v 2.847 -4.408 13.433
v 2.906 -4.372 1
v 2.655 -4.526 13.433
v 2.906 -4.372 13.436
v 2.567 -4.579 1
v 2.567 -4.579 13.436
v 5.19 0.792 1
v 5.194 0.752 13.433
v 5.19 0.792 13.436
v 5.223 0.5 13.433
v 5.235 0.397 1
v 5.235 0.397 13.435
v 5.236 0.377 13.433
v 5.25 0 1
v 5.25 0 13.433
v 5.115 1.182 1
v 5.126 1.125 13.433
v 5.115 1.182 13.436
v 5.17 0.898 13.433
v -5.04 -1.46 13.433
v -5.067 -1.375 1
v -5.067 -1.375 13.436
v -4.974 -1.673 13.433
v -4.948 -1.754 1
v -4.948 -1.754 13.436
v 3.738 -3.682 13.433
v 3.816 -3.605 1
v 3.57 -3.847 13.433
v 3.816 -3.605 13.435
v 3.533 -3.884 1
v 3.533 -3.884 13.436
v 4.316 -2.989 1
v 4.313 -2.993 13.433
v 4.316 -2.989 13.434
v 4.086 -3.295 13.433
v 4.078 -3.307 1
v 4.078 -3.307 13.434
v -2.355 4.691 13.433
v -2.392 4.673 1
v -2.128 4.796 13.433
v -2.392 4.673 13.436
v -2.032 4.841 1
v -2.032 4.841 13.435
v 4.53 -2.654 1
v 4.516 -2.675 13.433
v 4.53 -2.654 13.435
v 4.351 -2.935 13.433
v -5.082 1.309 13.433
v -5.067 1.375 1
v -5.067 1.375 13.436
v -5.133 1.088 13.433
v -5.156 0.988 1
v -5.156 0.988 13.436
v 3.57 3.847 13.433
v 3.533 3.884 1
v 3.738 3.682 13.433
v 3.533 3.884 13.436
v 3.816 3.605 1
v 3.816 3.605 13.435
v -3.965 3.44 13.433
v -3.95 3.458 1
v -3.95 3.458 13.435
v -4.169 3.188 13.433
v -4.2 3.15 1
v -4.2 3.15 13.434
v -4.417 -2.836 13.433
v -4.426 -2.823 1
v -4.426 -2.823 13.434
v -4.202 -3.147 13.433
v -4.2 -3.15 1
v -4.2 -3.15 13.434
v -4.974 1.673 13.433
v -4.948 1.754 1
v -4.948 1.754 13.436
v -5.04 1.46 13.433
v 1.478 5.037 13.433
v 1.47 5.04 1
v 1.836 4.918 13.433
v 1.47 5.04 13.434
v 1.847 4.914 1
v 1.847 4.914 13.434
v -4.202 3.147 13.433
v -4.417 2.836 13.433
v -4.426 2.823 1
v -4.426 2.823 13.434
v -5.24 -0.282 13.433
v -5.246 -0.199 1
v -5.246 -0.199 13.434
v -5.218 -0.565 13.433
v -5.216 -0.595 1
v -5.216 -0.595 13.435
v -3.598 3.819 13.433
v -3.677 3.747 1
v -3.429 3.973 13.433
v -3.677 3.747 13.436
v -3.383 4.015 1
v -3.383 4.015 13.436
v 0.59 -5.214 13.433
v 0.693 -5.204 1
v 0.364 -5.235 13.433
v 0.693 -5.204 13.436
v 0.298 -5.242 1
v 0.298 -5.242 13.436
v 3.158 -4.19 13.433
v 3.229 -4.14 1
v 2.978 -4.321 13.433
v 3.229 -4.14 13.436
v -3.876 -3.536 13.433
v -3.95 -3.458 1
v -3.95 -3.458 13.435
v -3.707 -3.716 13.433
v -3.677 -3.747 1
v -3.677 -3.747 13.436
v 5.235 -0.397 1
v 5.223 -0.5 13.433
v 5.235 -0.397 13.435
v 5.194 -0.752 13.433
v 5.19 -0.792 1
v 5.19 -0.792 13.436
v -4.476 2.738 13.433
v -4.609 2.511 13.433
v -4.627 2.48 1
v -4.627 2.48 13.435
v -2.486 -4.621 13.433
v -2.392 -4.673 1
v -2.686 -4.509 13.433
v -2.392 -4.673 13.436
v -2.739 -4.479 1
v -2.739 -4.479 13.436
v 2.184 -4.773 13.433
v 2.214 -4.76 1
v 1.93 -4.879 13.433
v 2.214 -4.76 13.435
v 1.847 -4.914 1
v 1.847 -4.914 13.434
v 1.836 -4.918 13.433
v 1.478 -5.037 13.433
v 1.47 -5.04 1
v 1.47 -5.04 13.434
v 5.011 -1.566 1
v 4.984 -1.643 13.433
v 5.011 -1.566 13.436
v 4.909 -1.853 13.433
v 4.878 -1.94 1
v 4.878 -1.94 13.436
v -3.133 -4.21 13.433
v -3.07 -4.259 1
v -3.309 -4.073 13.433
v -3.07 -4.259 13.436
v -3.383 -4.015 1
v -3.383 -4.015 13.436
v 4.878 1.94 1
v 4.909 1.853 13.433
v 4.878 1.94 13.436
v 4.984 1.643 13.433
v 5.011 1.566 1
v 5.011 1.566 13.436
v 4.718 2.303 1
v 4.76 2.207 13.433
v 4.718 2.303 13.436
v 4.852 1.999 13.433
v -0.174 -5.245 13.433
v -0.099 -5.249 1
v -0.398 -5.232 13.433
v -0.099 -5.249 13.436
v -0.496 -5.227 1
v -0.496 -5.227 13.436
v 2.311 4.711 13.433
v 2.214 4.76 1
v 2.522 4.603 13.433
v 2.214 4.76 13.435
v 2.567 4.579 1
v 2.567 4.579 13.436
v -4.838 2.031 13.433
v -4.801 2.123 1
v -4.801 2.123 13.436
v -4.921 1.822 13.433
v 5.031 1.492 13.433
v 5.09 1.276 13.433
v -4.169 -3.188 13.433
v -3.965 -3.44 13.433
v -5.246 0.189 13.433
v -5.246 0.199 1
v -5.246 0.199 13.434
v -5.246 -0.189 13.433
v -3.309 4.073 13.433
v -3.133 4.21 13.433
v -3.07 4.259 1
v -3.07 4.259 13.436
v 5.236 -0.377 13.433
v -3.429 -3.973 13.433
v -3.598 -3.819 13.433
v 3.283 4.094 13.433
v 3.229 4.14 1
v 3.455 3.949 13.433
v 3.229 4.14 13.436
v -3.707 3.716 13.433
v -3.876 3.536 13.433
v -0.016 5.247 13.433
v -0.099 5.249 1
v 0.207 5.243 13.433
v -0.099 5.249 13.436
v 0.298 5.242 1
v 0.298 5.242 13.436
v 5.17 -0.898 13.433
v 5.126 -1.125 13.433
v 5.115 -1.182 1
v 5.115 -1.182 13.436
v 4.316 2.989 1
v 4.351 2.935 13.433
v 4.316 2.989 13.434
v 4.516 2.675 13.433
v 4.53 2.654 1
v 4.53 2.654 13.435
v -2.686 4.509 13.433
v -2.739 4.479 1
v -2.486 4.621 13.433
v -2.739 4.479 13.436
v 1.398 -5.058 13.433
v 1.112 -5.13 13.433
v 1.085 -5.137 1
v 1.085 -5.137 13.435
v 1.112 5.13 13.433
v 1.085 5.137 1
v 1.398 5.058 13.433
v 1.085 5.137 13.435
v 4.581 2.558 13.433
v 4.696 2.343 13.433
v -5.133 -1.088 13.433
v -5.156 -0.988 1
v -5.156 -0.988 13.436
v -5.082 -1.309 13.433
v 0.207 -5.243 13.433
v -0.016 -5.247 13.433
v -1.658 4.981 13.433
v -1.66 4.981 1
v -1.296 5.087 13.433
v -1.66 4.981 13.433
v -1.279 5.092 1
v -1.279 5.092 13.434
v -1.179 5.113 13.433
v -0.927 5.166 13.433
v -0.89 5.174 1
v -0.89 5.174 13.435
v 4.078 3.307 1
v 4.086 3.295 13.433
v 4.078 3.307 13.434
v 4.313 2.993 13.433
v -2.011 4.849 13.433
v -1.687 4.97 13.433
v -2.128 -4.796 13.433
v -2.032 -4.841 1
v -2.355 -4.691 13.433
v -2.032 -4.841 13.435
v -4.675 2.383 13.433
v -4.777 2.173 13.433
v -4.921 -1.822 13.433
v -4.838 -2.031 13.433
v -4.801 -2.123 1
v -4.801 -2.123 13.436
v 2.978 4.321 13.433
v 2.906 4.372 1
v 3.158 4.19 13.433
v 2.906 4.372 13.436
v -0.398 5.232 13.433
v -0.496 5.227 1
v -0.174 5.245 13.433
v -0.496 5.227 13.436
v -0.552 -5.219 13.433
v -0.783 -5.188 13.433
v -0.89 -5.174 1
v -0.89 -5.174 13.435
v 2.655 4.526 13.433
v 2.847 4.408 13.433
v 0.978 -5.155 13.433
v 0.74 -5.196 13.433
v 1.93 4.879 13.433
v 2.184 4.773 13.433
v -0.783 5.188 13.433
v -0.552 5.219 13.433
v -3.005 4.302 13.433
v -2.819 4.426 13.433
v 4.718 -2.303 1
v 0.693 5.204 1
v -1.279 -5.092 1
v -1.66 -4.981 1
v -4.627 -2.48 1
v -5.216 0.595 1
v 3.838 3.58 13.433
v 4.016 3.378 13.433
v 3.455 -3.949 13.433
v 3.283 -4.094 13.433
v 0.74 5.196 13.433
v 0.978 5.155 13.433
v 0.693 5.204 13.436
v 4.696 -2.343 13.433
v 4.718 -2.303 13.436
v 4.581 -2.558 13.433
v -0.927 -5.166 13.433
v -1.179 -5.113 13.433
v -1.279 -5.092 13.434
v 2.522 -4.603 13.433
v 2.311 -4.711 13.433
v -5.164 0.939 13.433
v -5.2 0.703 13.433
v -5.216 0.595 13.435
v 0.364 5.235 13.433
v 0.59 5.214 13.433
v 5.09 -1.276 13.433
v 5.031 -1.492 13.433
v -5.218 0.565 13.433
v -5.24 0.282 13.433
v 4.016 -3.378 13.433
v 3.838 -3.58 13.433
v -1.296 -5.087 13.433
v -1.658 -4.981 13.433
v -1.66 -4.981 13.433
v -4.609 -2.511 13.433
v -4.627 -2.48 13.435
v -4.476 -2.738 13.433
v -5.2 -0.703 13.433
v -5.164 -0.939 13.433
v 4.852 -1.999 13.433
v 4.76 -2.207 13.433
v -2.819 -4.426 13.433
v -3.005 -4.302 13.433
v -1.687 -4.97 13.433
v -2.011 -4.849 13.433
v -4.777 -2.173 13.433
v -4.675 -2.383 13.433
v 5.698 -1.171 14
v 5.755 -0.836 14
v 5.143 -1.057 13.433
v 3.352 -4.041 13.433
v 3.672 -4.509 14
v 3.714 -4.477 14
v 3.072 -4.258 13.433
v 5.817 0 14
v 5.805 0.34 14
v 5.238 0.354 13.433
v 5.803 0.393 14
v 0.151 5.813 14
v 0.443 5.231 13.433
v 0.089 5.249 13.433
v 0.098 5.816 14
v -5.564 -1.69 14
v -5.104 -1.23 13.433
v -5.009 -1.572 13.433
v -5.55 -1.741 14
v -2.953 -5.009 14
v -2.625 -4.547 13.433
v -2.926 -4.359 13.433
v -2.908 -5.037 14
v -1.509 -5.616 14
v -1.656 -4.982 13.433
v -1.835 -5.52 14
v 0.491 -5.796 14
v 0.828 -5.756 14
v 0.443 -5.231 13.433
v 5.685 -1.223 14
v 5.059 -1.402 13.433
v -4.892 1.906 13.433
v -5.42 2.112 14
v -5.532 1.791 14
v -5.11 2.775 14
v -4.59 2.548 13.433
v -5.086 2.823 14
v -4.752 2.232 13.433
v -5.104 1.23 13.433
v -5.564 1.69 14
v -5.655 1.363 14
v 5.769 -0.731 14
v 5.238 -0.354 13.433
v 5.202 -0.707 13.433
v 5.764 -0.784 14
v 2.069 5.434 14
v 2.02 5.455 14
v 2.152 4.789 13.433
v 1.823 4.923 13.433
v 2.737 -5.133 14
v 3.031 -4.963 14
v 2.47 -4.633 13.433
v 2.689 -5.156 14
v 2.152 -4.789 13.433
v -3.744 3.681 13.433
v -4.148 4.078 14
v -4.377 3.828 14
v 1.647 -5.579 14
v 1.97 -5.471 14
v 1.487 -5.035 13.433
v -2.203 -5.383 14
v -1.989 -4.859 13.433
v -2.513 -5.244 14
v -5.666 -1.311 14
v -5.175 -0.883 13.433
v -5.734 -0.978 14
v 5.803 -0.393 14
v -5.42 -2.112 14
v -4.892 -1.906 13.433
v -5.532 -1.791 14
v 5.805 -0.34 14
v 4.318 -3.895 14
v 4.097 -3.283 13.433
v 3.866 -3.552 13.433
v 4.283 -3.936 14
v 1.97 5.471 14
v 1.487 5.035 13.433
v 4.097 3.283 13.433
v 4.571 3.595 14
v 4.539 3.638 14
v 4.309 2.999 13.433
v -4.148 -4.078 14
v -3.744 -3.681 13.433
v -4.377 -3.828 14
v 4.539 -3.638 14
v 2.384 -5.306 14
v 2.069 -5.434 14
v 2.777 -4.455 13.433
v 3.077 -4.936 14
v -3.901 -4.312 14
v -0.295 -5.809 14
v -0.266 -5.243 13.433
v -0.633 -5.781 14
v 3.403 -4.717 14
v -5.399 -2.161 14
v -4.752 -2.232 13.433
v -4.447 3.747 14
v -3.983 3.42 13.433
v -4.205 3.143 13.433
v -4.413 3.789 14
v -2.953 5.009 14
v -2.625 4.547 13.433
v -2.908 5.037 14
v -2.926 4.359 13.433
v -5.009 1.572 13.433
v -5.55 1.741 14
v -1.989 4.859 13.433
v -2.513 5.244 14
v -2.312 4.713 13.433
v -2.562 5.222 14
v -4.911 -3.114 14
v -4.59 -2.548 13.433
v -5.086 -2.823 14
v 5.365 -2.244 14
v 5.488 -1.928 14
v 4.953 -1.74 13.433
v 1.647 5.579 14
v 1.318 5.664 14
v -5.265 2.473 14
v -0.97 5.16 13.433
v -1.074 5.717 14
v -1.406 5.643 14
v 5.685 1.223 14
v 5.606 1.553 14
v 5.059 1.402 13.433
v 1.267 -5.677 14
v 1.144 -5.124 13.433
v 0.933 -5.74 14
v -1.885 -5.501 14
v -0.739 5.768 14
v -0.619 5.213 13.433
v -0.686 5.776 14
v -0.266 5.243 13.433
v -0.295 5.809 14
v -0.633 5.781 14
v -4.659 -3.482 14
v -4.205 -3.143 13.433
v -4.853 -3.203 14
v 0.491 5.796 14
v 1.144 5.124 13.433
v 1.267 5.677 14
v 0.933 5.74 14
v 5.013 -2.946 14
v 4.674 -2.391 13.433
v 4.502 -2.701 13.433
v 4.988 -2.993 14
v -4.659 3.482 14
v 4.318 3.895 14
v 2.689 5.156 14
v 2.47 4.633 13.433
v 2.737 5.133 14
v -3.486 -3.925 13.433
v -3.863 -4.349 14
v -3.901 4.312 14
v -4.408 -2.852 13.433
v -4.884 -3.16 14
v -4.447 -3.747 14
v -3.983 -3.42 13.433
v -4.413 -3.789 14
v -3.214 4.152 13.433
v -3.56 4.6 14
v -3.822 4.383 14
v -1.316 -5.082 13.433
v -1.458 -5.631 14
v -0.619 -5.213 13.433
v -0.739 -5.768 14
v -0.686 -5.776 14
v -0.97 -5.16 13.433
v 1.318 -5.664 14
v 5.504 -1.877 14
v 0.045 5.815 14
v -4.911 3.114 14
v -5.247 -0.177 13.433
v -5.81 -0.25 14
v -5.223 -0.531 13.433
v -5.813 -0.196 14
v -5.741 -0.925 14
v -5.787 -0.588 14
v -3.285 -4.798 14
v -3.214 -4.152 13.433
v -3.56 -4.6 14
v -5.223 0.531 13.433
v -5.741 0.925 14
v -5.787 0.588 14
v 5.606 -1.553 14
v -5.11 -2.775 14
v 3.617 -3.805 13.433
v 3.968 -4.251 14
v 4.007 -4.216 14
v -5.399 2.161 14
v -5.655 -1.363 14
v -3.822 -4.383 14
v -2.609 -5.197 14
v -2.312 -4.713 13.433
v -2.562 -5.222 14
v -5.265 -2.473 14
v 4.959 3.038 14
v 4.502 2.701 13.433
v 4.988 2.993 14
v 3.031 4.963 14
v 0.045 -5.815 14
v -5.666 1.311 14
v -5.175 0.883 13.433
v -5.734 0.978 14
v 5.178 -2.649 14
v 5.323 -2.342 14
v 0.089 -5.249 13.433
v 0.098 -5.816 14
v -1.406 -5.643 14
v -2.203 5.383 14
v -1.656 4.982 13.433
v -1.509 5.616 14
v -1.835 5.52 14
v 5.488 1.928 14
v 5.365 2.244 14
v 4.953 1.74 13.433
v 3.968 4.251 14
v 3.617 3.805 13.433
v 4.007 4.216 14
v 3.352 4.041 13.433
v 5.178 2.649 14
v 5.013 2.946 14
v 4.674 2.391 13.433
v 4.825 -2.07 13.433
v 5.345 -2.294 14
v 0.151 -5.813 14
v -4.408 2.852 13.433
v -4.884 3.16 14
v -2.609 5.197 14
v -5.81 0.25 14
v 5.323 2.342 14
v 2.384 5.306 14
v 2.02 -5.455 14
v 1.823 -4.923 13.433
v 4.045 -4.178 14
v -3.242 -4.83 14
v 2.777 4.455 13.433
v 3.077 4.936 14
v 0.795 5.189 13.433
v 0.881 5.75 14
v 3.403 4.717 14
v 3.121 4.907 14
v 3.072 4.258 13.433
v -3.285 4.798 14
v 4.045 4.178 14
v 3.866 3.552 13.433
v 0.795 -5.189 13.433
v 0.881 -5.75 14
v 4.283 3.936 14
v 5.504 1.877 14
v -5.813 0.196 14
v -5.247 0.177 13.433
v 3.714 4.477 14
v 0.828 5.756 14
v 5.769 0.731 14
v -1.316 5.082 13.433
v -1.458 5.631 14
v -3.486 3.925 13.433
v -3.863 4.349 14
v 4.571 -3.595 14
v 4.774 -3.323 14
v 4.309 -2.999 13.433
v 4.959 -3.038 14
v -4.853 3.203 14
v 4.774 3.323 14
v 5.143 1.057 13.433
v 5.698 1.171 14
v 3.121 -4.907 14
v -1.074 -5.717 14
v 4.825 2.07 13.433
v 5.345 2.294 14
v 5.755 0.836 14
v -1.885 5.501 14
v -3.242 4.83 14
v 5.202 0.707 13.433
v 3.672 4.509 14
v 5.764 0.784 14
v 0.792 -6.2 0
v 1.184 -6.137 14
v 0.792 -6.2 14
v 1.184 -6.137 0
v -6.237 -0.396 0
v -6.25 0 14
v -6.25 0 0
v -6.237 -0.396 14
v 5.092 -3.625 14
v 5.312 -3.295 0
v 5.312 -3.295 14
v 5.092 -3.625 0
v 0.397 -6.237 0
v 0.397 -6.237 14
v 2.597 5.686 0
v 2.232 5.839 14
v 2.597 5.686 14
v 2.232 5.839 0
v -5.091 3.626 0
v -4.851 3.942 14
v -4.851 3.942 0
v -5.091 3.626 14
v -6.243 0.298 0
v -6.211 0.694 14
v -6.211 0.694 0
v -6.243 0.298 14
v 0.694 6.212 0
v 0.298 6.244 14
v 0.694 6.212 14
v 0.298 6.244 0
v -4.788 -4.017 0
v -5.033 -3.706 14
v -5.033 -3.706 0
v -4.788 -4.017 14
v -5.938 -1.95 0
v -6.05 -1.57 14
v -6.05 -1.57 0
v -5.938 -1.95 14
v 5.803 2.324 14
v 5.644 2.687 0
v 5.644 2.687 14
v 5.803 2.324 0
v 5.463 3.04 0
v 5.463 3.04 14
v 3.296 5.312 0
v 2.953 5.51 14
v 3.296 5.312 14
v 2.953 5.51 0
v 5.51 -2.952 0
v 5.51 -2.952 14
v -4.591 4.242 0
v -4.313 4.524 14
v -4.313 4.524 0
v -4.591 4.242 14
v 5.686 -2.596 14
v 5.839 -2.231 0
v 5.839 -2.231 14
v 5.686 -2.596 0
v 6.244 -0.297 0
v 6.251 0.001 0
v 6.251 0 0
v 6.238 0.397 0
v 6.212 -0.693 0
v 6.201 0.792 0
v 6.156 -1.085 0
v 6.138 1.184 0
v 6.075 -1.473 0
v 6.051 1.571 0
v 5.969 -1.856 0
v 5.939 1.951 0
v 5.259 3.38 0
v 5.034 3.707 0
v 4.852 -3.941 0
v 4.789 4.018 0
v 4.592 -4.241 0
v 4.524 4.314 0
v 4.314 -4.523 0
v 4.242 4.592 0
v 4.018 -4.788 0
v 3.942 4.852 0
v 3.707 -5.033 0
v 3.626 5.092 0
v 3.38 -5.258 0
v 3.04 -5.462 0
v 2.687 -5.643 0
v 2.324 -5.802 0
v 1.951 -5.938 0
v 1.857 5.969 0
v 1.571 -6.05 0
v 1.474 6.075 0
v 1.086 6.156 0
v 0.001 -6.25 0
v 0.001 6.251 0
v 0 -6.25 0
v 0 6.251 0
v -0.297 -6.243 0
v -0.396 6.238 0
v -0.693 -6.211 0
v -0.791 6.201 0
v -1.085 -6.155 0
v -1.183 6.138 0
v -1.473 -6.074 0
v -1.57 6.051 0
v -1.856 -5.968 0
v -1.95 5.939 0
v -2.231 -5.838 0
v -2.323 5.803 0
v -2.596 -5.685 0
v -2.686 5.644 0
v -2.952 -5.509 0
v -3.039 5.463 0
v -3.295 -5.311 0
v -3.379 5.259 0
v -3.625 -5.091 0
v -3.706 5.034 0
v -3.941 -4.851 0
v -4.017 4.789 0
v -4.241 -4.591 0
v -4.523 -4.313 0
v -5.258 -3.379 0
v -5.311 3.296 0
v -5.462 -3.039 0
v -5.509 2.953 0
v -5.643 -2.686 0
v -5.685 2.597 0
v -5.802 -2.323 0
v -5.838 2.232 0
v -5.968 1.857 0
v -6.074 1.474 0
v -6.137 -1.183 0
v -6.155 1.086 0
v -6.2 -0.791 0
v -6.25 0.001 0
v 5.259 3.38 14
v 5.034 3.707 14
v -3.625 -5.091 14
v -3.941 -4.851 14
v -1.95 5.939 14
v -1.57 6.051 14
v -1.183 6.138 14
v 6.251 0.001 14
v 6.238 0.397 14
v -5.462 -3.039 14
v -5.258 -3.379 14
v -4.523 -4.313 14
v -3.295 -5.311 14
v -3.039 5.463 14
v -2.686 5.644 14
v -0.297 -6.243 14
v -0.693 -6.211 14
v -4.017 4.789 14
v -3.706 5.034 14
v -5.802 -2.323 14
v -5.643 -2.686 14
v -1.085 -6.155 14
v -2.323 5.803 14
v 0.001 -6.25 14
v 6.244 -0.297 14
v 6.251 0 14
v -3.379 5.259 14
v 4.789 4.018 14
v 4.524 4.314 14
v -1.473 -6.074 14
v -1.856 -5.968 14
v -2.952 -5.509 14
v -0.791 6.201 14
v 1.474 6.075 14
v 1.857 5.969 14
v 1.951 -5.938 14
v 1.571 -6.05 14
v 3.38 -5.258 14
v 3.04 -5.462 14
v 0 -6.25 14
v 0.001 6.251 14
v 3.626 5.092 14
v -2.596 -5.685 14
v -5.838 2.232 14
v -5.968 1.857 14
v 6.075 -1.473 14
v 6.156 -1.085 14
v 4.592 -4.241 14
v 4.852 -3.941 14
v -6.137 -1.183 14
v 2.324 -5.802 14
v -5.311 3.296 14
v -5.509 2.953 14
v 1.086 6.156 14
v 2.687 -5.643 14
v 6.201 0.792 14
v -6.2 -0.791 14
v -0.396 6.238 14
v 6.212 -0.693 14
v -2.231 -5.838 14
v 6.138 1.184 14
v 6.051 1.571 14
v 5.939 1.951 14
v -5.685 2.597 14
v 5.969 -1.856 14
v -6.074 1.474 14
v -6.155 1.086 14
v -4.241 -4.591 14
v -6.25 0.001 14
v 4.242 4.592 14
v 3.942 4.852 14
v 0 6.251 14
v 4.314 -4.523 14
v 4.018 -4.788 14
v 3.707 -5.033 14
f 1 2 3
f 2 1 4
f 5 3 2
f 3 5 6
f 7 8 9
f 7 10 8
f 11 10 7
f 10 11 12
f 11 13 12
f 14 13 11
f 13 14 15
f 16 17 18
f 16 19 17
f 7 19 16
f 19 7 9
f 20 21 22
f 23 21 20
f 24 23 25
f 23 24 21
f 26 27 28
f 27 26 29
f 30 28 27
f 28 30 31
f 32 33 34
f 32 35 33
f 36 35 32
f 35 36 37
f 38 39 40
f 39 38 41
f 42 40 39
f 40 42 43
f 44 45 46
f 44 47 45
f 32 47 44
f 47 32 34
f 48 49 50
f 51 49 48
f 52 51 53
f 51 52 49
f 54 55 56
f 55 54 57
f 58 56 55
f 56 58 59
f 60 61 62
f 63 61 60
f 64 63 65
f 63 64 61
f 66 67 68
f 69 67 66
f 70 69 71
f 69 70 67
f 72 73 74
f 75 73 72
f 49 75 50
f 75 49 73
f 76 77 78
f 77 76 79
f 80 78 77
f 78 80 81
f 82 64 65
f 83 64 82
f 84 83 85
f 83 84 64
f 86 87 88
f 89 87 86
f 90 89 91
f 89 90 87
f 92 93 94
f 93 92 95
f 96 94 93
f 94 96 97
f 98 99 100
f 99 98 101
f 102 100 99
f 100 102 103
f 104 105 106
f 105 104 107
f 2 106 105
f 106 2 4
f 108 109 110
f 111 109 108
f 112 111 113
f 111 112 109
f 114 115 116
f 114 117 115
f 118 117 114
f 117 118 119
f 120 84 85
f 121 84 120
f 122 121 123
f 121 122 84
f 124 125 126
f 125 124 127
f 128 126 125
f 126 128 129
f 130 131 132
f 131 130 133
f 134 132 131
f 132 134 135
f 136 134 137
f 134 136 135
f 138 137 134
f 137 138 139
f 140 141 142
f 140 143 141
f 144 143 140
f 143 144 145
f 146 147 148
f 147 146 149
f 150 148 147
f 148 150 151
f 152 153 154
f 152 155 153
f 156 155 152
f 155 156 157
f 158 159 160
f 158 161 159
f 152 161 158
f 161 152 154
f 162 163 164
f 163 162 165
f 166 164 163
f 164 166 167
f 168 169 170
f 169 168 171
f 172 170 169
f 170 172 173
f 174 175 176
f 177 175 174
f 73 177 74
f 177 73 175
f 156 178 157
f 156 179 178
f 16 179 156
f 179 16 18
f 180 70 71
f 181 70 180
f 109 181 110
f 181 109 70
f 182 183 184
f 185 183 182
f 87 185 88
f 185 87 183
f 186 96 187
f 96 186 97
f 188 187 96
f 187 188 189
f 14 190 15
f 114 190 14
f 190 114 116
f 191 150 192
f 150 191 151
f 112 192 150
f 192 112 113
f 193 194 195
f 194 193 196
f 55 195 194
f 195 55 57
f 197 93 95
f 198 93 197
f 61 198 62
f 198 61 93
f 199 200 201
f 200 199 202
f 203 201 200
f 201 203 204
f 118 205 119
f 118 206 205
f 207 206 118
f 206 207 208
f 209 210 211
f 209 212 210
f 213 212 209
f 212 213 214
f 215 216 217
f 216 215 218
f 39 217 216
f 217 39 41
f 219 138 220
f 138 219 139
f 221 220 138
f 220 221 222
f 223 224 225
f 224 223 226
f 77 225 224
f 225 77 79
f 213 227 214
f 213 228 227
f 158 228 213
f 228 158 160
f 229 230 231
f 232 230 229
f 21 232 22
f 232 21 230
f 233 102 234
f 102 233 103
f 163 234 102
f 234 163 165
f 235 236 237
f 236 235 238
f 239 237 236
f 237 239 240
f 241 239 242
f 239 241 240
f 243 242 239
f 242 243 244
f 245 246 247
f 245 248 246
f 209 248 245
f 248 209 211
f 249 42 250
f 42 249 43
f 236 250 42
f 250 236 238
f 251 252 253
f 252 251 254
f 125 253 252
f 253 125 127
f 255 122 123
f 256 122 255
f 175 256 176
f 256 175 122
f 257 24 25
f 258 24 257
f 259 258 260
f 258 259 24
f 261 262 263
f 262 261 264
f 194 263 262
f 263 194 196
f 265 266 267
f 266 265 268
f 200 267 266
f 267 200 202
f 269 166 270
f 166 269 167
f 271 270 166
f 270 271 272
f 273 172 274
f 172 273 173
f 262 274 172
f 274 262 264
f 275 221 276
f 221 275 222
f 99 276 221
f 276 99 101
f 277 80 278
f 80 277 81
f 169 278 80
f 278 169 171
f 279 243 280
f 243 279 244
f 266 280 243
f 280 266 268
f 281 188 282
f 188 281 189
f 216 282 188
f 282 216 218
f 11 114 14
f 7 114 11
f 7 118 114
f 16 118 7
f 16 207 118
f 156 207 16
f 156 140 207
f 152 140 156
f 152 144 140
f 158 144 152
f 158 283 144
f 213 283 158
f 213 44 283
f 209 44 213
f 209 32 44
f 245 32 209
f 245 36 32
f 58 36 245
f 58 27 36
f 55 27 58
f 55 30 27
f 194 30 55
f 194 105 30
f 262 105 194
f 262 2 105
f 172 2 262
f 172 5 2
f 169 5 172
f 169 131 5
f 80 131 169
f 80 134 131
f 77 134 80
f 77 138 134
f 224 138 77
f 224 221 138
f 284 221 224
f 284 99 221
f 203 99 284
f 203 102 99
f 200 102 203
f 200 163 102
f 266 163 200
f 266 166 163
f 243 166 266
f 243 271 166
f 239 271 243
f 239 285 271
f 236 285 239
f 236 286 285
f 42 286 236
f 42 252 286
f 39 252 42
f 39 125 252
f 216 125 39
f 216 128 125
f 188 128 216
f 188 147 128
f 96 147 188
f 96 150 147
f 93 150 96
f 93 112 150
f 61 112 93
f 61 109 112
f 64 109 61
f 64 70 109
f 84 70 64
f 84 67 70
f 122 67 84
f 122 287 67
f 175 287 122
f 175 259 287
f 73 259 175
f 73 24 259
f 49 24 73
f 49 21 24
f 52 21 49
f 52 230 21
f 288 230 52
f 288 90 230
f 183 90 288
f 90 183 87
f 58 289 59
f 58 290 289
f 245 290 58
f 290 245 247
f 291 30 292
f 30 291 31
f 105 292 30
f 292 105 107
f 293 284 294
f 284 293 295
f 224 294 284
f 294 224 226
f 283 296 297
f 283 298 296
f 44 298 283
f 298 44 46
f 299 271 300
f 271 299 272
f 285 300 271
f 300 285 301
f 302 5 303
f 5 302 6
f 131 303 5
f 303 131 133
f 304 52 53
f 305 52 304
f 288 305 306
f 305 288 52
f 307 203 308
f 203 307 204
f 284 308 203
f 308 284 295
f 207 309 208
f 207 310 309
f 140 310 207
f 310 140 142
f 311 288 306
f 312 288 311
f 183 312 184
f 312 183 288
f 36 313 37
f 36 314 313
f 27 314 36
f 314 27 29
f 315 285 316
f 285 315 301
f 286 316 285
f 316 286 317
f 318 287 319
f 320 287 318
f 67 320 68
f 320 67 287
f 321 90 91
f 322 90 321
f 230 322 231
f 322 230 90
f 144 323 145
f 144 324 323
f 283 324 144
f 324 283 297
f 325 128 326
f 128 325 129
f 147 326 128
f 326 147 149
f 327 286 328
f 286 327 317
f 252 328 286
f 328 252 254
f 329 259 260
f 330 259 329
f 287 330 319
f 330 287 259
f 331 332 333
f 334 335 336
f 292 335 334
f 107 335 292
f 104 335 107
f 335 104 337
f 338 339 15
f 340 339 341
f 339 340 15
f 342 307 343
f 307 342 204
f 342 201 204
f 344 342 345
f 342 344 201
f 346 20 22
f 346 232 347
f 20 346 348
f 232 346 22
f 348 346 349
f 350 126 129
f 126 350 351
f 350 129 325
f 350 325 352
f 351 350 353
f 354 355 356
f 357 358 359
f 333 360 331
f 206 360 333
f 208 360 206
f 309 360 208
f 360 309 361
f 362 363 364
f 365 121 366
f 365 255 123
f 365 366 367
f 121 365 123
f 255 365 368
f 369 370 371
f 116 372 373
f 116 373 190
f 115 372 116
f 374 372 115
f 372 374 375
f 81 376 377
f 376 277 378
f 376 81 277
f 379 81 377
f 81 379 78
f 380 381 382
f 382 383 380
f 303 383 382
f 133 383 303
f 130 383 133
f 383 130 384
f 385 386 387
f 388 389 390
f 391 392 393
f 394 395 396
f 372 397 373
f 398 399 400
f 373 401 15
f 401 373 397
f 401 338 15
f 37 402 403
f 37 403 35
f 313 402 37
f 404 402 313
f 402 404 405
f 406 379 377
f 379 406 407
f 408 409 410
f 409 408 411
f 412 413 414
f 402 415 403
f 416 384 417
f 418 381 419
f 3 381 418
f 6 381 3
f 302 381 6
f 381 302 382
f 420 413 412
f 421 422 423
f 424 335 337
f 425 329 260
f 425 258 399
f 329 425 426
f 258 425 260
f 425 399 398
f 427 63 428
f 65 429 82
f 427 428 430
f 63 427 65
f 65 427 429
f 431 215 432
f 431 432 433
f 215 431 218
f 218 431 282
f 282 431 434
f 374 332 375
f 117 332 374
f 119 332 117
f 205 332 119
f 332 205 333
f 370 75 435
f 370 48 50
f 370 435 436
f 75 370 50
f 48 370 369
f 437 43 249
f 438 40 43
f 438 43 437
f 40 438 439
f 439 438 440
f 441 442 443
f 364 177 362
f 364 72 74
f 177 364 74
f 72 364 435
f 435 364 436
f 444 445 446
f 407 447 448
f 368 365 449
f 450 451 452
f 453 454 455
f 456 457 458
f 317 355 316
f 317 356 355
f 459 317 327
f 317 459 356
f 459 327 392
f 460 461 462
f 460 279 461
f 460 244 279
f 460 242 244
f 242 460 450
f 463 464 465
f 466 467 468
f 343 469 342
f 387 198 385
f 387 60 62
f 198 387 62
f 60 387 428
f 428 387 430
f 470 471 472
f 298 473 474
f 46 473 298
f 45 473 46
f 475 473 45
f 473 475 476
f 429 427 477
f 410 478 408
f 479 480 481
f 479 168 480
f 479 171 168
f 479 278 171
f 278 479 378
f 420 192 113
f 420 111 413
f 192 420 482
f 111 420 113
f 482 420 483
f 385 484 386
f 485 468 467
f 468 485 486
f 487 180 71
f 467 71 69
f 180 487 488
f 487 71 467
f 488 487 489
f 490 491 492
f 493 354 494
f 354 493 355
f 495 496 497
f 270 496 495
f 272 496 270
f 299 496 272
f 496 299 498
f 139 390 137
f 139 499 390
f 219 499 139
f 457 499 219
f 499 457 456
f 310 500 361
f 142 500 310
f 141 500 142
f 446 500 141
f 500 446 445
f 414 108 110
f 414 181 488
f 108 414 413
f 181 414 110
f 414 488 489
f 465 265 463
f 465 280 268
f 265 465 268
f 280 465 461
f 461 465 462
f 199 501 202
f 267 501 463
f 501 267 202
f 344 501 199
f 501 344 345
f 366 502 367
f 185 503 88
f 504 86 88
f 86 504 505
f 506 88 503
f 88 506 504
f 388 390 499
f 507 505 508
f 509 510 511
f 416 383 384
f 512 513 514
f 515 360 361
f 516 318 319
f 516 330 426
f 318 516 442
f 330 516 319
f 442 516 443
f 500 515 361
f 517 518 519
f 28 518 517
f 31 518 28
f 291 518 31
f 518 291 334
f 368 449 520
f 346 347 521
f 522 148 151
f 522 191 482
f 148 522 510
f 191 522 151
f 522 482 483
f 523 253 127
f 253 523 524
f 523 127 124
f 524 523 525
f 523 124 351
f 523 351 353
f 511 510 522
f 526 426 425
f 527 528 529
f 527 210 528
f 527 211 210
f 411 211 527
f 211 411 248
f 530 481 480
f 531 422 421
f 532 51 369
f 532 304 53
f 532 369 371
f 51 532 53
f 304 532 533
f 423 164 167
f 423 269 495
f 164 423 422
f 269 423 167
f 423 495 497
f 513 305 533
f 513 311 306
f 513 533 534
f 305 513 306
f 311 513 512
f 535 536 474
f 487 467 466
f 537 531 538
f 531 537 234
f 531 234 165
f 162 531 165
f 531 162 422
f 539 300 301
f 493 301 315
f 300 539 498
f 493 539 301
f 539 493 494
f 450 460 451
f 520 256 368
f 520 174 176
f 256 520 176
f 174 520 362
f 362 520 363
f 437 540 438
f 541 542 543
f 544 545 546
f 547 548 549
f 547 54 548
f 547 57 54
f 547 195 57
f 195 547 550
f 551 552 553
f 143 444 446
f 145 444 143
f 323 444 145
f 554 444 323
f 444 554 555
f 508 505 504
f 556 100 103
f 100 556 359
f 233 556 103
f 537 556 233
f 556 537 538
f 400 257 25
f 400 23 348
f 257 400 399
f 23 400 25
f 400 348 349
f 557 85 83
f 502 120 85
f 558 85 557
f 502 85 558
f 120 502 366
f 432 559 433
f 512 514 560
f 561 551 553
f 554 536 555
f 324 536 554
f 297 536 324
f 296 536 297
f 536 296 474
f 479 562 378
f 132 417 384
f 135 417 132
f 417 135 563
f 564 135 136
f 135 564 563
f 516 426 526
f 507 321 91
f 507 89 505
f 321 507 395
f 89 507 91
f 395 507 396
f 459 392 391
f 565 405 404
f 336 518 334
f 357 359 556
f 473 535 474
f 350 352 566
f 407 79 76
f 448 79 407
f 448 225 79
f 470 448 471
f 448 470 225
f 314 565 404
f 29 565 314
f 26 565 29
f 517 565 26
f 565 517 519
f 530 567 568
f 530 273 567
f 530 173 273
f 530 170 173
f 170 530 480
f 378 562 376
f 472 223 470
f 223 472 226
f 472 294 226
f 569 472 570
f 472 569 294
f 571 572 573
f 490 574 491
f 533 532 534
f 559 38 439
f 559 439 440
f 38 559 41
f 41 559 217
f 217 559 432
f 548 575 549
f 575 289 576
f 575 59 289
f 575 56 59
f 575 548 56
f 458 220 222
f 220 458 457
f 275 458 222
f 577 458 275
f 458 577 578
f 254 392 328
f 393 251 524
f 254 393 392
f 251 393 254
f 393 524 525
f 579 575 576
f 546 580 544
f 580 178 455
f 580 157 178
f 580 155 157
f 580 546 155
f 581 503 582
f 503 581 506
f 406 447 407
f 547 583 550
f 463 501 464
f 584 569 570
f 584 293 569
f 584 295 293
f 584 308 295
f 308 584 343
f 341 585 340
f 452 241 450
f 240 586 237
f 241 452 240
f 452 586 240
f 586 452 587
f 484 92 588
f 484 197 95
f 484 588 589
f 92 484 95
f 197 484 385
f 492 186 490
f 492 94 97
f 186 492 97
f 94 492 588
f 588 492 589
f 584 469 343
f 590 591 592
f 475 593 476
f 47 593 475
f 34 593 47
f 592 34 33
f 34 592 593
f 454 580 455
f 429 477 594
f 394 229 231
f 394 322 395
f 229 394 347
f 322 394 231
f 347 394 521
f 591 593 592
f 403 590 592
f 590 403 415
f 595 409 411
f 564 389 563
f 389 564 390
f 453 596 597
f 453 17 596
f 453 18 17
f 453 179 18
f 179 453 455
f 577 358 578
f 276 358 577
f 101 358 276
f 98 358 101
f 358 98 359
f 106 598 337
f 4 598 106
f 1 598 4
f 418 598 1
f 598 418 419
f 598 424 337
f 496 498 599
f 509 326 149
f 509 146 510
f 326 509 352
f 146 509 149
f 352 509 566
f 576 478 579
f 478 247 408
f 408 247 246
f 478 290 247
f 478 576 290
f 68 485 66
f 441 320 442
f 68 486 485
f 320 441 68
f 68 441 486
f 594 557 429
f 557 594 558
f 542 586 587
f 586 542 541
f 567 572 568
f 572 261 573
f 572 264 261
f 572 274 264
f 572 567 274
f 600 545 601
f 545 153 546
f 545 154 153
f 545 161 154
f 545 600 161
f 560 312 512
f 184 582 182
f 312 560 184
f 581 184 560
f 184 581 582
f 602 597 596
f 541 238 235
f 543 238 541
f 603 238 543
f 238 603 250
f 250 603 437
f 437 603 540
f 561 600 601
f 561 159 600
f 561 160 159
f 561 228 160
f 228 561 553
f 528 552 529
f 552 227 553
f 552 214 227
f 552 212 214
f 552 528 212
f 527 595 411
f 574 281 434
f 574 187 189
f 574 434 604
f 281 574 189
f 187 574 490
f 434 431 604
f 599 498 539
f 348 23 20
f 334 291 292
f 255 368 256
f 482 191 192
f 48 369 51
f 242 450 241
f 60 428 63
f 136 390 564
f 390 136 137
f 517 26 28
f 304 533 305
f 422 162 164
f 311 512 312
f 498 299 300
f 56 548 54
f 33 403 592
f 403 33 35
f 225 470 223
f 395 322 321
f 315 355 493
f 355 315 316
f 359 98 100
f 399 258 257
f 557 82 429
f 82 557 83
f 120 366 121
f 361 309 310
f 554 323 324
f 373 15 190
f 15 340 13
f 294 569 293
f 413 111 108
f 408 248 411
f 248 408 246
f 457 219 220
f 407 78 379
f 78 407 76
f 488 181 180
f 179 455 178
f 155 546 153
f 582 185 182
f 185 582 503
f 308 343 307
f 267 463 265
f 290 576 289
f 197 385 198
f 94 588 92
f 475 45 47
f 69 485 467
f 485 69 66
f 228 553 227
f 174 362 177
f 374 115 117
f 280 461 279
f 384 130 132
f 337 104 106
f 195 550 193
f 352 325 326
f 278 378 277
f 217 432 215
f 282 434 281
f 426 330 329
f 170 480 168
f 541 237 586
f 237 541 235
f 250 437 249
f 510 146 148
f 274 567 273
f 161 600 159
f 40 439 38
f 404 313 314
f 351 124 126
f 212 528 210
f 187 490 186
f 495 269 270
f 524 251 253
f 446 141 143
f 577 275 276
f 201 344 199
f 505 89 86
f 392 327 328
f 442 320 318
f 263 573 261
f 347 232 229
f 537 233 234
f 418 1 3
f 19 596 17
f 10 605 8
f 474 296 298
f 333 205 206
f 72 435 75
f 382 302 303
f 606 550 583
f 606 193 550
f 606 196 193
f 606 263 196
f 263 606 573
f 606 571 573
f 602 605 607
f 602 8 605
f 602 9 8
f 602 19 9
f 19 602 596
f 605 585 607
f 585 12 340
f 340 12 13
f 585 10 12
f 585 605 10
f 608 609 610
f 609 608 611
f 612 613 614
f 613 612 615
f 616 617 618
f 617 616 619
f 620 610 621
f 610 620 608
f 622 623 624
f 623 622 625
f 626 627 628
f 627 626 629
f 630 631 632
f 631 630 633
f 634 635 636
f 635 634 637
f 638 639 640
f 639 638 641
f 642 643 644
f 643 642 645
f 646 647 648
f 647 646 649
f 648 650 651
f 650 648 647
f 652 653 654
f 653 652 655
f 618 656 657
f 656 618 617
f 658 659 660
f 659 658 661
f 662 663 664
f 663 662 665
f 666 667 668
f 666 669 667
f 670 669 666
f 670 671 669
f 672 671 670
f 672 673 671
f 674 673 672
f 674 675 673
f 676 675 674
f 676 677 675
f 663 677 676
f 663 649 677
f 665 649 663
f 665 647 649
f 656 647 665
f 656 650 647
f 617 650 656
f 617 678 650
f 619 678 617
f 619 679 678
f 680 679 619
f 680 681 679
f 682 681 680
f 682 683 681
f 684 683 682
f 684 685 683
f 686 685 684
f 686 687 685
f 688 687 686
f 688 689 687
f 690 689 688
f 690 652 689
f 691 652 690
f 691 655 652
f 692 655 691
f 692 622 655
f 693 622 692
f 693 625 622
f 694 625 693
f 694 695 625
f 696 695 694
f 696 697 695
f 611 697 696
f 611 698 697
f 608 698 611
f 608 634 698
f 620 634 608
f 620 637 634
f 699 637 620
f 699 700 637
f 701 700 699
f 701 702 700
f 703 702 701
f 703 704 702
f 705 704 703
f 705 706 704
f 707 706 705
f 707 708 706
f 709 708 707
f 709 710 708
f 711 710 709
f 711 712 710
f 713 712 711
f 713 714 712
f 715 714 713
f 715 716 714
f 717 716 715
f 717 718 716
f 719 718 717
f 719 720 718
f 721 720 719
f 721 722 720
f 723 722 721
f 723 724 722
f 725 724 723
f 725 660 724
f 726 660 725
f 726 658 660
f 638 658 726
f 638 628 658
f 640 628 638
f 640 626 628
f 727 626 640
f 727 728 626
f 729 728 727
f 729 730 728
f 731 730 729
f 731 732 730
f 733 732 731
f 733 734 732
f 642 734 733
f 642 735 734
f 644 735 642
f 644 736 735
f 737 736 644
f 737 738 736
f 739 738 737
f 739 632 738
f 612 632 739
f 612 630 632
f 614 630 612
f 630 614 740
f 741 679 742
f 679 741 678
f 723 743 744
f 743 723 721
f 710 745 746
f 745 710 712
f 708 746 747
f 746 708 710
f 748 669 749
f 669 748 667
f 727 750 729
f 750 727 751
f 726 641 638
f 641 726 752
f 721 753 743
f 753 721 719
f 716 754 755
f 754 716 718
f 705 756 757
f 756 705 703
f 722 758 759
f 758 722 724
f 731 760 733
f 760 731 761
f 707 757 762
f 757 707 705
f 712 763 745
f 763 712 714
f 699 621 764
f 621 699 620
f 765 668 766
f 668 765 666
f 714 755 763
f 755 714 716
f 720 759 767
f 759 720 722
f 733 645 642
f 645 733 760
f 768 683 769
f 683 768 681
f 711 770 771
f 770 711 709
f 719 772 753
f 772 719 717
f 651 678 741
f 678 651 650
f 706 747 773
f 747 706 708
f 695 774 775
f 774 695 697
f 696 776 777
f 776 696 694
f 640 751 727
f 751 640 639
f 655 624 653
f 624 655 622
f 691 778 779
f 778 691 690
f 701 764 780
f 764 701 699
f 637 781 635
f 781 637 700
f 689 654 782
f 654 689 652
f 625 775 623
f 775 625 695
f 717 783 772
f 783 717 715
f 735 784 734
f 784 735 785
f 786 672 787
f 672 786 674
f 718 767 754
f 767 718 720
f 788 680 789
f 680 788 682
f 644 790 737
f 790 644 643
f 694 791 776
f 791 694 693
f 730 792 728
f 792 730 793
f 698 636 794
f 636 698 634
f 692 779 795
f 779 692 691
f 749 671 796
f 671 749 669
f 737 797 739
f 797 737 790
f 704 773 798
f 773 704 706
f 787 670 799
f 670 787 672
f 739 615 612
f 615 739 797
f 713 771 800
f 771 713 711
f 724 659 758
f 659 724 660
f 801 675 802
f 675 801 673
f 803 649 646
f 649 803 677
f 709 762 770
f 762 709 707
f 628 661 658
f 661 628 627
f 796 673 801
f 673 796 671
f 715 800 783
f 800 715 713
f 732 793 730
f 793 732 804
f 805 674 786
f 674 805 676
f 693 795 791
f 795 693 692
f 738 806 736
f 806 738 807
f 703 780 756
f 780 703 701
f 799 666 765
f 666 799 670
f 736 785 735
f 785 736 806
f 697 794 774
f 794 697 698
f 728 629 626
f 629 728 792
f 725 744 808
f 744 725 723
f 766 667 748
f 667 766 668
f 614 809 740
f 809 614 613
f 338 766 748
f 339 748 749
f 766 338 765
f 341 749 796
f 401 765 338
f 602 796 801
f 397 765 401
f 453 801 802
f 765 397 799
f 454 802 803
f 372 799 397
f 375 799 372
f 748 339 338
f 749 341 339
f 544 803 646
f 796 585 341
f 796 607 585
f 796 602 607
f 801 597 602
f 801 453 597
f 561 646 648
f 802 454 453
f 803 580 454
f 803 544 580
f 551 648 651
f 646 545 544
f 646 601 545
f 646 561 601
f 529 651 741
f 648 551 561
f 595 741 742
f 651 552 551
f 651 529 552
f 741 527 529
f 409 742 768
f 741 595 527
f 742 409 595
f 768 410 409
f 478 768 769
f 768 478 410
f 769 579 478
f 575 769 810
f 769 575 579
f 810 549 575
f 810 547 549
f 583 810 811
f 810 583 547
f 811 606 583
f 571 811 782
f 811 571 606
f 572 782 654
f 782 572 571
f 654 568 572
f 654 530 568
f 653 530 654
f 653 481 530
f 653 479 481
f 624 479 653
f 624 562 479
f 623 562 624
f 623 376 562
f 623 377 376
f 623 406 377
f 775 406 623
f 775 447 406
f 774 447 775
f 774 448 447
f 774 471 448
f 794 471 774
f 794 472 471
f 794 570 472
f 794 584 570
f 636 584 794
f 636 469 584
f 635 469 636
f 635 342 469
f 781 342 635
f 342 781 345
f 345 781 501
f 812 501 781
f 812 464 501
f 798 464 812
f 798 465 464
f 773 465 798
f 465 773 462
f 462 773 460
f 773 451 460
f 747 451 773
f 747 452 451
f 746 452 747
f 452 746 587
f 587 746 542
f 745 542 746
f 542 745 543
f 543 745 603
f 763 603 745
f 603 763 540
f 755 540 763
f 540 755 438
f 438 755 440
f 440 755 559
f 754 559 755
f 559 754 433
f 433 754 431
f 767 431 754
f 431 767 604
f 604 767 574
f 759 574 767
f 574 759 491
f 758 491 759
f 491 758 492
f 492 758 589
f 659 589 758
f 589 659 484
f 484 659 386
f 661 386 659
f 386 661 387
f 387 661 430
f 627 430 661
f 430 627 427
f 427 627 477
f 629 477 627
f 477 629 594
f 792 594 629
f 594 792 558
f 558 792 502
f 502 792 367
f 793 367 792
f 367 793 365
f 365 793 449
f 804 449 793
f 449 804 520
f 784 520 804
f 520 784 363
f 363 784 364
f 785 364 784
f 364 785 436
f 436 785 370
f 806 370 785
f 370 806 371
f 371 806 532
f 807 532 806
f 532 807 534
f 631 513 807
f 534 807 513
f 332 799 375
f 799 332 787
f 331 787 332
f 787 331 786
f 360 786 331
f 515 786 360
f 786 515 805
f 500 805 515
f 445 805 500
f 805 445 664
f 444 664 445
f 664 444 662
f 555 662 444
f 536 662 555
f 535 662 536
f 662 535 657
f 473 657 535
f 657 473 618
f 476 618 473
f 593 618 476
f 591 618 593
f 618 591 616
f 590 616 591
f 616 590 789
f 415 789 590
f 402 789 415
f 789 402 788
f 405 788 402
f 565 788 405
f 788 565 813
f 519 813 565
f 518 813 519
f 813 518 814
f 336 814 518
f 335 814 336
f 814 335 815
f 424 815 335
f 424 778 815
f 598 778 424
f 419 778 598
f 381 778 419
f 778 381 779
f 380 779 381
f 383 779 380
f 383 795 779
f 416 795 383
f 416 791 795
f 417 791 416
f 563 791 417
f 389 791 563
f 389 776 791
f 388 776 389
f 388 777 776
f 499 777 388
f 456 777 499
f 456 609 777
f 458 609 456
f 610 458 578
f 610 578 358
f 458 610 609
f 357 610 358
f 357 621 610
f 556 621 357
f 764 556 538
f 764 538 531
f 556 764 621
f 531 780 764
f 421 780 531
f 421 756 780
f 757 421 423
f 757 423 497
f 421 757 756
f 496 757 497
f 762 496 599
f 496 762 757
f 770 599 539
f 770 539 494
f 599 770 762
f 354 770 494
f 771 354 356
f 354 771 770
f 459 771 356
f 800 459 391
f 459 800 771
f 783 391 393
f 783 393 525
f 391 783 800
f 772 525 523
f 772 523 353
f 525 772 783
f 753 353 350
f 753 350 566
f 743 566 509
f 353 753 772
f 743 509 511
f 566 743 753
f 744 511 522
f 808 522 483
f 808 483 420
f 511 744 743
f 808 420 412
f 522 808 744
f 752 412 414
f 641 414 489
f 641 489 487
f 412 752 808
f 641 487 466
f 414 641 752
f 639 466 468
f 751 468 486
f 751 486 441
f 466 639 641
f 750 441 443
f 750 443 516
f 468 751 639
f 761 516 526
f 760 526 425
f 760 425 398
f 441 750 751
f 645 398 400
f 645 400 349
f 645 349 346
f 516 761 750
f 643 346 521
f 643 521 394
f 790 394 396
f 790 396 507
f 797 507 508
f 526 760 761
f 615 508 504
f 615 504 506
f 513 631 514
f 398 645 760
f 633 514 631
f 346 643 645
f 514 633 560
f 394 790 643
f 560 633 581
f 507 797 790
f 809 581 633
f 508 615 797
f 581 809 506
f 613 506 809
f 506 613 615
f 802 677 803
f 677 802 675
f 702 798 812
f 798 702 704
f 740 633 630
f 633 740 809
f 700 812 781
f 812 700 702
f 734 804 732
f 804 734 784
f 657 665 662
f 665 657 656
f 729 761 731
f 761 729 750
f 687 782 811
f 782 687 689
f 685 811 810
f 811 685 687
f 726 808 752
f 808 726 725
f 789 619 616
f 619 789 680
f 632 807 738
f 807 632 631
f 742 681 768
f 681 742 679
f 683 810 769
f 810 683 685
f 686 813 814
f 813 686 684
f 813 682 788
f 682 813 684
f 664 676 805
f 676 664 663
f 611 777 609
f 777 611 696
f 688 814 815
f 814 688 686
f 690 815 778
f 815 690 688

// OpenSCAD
// Created in 2018 by Ryan A. Colyer.
// This work is released with CC0 into the public domain.
// https://creativecommons.org/publicdomain/zero/1.0/
//
// https://www.thingiverse.com/thing:3024664

battery_diam = 10.3; // AAA
//battery_diam = 14.3; // AA
//battery_diam = 25.2; // C
//battery_diam = 33.2; // D
//battery_diam = 18.5; // 18650
clearance = 0.2;
rimthick = 1;
basethick = 1;

numx = 1;
numy = 1;

battery_depth = 13;

$fa = 1;
$fs = 0.4;

hole_diam = battery_diam + clearance;

height = battery_depth + basethick;

pitch = hole_diam + rimthick;

squarex = numx*pitch - rimthick - hole_diam + 0.001;
squarey = numy*pitch - rimthick - hole_diam + 0.001;

chamferby = rimthick * 2/3;

echo(squarex, squarey);

difference() {
  linear_extrude(height=height)
    offset(r=rimthick+hole_diam/2)
    square(size = [squarex, squarey]);

  for(y=[0:numy-1])
    for(x=[0:numx-1])
      translate([x*pitch, y*pitch, rimthick])
        union() {
          cylinder(d=hole_diam, h=battery_depth+0.1);
          translate([0, 0, battery_depth+0.1-chamferby])
            cylinder(d1=hole_diam, d2=hole_diam+2*chamferby, h=chamferby);
        }
}
